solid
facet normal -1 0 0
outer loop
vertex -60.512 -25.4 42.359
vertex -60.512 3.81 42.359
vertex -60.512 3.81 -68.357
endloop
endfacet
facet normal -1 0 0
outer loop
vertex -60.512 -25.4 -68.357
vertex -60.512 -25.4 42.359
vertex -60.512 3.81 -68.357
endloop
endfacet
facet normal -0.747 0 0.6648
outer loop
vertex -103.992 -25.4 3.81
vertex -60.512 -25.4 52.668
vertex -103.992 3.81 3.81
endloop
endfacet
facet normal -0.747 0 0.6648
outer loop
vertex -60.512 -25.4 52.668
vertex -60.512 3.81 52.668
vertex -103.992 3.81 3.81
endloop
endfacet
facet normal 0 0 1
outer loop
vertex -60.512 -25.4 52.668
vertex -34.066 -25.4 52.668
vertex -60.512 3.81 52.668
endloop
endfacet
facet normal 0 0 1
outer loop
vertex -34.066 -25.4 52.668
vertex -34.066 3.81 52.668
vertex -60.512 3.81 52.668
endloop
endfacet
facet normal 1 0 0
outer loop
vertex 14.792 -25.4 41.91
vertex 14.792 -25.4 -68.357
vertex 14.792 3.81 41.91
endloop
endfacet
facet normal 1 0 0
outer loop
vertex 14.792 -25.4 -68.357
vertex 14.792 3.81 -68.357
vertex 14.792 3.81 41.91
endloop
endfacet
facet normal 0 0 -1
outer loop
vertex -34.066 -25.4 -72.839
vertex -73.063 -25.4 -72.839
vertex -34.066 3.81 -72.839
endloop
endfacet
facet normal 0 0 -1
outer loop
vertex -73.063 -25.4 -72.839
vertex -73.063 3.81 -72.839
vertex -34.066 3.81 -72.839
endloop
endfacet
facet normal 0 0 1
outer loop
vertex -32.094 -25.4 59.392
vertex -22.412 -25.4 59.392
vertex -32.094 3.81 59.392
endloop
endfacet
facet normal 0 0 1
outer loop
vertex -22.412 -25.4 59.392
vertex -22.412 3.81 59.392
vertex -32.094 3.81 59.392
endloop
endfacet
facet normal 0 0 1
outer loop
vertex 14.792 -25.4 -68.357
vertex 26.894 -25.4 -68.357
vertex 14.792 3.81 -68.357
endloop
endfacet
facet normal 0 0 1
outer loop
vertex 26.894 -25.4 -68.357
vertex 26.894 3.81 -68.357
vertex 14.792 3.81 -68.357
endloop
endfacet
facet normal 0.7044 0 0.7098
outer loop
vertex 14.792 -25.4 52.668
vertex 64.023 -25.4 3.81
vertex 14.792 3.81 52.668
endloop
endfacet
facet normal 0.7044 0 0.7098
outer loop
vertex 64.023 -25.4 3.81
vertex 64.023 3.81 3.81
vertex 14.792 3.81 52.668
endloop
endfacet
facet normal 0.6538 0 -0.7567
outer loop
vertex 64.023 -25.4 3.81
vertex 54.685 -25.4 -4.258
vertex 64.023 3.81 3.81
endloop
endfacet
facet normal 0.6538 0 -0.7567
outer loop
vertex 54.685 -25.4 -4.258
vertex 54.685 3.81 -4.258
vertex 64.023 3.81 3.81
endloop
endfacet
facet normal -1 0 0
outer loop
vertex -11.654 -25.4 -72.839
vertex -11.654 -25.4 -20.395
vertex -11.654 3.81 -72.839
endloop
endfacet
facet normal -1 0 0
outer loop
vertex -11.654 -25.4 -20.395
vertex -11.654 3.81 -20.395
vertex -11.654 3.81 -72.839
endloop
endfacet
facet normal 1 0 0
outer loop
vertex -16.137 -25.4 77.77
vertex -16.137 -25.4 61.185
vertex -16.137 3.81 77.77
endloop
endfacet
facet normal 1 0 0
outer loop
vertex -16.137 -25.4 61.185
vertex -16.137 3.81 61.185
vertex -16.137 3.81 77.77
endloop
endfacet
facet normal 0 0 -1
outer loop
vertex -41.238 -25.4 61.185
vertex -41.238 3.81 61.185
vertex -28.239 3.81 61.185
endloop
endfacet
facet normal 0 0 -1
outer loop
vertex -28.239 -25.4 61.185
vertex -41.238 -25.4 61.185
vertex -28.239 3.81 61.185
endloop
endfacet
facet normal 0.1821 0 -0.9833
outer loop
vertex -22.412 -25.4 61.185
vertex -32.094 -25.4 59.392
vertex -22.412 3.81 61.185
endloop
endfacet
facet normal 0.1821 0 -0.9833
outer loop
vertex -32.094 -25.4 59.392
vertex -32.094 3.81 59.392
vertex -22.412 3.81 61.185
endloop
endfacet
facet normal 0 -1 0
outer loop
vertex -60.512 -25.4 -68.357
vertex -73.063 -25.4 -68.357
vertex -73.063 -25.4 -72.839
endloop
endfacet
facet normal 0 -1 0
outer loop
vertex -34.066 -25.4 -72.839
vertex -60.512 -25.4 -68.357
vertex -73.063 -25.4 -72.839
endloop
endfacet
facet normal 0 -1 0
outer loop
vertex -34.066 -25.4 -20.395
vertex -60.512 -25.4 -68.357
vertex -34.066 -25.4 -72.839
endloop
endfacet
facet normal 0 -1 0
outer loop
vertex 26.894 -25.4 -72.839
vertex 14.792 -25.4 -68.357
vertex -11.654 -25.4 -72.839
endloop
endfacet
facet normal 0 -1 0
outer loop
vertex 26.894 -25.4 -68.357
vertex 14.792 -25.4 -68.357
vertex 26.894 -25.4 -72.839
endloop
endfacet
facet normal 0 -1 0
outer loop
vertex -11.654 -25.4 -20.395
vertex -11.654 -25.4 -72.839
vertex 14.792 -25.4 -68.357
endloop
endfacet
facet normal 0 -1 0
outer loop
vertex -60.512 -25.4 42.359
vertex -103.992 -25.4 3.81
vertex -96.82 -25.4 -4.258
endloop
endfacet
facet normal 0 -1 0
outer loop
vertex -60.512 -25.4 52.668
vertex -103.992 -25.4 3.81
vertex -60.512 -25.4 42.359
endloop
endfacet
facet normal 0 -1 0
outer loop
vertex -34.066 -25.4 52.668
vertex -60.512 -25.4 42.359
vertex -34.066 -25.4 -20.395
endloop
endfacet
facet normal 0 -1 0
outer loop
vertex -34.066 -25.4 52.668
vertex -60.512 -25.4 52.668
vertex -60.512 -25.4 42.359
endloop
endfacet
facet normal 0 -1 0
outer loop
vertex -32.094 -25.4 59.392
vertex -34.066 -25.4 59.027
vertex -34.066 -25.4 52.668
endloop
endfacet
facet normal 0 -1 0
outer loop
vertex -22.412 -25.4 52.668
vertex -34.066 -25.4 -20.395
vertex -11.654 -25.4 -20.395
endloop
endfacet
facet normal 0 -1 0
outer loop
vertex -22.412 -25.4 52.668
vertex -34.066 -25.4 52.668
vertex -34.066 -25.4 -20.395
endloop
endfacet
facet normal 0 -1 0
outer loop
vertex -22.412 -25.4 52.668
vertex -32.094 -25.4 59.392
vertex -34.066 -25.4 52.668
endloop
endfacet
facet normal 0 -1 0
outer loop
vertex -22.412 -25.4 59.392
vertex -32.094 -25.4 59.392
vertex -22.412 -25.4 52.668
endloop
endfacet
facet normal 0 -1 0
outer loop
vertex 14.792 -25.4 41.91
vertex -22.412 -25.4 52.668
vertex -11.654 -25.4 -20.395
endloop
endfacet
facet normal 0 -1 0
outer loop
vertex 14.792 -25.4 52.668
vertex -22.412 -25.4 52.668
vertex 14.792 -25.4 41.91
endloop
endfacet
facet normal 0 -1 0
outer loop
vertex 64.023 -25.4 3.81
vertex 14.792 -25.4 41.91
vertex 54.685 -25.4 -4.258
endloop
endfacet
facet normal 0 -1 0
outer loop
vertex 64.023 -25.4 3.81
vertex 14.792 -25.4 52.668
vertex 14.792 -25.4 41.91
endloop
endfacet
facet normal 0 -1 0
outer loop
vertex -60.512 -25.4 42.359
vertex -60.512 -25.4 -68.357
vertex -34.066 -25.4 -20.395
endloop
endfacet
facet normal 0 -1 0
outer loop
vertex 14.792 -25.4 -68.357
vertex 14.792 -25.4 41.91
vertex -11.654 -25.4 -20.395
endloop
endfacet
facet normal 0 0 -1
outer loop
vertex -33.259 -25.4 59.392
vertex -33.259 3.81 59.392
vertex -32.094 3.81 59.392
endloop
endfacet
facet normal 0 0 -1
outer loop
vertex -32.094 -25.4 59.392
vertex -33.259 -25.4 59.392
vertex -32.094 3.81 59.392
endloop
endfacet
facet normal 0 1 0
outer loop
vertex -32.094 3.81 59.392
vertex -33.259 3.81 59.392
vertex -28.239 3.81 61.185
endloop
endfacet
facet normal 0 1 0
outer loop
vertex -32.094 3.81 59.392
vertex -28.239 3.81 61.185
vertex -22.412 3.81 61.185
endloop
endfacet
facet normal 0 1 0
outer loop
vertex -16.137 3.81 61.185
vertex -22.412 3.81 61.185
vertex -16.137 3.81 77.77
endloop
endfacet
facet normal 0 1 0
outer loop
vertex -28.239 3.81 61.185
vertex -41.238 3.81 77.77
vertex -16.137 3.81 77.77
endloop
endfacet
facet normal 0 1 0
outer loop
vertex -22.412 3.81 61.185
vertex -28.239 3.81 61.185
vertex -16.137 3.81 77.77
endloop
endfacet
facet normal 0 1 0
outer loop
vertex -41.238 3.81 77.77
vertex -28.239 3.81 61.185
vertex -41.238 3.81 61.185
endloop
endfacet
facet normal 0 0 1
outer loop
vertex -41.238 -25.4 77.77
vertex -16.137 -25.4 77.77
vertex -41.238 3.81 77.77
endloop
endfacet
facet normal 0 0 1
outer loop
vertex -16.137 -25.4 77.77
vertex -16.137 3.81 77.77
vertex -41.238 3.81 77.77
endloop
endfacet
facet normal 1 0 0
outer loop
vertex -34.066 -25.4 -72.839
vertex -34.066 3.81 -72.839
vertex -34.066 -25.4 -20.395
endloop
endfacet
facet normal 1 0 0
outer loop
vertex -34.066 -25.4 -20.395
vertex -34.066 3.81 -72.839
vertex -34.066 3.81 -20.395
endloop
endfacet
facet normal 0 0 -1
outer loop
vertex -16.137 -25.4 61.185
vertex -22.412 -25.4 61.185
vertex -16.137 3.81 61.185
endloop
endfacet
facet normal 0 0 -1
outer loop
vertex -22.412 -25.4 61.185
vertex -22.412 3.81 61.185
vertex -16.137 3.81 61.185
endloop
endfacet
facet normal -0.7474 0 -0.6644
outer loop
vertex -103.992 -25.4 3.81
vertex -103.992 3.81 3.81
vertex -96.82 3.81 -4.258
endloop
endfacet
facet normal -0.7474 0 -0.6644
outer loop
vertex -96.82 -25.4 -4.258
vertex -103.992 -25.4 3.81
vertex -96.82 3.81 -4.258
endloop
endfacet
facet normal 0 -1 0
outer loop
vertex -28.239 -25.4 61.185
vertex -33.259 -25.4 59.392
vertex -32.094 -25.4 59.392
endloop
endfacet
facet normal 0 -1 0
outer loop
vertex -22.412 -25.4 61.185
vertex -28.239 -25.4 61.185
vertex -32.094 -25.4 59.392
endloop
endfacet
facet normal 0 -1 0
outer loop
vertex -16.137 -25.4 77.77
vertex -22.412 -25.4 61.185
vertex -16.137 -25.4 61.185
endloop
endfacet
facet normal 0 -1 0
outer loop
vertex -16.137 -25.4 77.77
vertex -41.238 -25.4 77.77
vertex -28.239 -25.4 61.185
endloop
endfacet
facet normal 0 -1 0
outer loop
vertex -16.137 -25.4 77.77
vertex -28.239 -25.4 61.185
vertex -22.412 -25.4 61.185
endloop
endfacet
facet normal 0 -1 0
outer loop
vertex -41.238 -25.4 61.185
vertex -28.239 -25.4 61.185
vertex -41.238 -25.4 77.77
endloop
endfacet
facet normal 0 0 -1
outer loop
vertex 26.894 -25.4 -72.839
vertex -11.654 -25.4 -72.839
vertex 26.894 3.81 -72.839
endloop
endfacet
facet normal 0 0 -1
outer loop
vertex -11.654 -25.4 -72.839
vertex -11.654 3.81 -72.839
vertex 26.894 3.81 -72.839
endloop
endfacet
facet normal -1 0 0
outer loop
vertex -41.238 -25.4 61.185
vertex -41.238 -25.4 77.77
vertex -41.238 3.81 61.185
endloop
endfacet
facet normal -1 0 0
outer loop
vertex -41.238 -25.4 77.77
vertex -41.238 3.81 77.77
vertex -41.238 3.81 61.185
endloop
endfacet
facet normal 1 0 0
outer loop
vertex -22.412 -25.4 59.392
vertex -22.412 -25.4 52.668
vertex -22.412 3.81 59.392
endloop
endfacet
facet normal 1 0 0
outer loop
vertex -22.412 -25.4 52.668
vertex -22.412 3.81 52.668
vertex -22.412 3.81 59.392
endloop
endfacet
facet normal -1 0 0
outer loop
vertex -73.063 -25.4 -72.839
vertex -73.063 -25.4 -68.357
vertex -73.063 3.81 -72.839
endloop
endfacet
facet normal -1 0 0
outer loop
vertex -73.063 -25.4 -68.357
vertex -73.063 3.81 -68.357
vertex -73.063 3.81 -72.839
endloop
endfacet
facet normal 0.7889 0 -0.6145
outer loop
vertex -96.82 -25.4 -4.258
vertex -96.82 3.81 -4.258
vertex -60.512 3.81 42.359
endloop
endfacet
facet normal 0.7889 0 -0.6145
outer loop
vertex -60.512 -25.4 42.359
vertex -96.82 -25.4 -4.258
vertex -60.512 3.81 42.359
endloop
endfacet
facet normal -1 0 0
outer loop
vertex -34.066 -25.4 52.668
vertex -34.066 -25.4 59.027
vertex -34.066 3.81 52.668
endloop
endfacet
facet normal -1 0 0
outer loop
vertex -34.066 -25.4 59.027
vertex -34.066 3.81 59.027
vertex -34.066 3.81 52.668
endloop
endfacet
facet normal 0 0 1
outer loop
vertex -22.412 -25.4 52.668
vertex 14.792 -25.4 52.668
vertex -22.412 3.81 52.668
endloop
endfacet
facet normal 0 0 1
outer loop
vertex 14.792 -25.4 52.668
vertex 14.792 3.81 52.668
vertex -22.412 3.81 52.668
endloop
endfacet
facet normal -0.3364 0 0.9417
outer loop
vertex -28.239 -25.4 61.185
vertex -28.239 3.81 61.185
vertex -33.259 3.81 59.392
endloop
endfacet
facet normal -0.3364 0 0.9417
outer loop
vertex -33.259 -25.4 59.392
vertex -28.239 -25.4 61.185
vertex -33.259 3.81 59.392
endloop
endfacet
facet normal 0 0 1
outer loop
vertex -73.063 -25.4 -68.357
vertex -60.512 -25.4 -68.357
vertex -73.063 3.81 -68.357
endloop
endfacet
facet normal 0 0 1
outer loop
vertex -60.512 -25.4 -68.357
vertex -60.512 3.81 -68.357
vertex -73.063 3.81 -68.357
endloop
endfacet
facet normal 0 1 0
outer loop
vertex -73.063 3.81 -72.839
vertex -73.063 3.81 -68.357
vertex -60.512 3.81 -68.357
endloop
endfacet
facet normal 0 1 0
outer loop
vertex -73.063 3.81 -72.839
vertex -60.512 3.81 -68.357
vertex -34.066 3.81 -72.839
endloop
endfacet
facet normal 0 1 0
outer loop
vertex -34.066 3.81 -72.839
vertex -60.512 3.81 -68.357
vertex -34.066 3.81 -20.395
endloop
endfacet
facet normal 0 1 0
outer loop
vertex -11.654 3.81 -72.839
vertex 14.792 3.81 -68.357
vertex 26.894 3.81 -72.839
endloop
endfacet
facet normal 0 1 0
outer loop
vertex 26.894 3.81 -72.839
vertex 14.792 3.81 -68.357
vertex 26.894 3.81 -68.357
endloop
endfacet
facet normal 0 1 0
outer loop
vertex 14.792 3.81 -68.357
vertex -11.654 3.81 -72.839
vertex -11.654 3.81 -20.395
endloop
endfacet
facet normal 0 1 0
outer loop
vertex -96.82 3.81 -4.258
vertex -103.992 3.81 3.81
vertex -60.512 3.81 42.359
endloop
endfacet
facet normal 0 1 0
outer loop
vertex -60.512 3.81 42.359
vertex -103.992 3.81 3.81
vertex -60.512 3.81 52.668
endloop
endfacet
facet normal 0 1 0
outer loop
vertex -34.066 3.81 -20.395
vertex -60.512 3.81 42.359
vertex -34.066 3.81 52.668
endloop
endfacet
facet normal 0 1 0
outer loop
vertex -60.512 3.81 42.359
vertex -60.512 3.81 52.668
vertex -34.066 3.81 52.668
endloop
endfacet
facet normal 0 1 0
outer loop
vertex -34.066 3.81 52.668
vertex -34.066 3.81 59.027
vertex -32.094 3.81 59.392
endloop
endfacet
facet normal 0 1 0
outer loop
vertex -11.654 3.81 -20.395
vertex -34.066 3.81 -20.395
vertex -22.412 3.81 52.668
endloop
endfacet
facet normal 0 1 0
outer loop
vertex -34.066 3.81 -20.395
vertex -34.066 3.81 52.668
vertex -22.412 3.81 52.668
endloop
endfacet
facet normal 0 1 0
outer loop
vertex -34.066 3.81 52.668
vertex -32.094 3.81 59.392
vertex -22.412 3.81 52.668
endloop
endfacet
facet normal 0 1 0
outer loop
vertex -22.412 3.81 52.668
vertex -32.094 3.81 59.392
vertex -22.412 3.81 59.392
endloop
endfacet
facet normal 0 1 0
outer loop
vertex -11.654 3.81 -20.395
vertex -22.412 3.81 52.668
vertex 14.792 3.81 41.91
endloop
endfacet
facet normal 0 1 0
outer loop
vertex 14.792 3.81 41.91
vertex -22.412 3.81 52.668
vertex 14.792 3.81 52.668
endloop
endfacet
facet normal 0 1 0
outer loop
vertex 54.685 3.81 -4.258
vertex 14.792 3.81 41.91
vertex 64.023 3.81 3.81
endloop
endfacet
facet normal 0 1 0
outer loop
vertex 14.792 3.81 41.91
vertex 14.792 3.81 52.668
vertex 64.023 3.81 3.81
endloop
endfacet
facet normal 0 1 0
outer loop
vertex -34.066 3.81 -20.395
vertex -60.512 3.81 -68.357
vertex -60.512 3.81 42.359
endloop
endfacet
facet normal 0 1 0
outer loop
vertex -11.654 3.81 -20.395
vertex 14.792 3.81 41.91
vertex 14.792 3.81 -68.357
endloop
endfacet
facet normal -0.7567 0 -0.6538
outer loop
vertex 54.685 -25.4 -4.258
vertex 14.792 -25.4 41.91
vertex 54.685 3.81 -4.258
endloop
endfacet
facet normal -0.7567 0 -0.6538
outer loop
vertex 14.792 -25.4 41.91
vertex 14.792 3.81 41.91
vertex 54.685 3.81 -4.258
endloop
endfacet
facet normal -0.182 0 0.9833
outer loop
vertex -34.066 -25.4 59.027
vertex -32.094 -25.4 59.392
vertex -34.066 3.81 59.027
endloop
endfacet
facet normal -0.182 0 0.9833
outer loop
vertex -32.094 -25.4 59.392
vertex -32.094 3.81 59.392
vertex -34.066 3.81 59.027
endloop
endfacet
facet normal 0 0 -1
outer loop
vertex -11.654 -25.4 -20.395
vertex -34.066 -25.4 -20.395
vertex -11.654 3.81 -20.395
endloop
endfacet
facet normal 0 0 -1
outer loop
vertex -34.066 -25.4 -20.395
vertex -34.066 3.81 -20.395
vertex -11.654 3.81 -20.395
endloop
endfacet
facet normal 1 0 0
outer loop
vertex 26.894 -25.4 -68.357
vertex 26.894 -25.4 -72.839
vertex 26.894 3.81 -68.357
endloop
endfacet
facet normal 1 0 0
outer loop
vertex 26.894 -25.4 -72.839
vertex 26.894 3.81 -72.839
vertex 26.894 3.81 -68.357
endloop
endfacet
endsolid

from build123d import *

# Parameters (mm, degrees)
F0_W     = 26.4462009072
F0_H     = 47.9617509991
F0_W_2   = 26.4461962506
F1_DEPTH = 3.81
F2_DEPTH = 25.4
F3_DEPTH = 25.4


with BuildPart() as f1:
    # F0 (on Front) → F1 (new body)
    with BuildSketch(Plane.XZ):
        Polygon((-60.5124868453, 42.3587411642), (-60.5124868453, -8.7406923994), (14.7919422016, -8.7406923994), (14.7919422016, 41.9104993343), (54.6853654087, -4.2582862079), (64.0228714011, 3.8100455422), (14.7919422016, 52.6682771742), (-5.8271270245, 52.6682771742), (-22.412031889, 52.6682771742), (-34.066285938, 52.6682771742), (-45.2723056078, 52.6682771742), (-60.5124868453, 52.6682771742), (-103.9918288589, 3.8100455422), (-96.8199819326, -4.2582862079), align=None)
        with Locations((-47.2893863916, -44.375824742)):
            Rectangle(F0_W, F0_H)
        with Locations((1.5688440762, -44.375824742)):
            Rectangle(F0_W_2, F0_H)
        Polygon((-60.5124868453, -8.7406923994), (-60.5124868453, -20.3949492425), (-34.066285938, -20.3949492425), (-11.6542540491, -20.3949492425), (14.7919422016, -20.3949492425), (14.7919422016, -8.7406923994), align=None)
        Polygon((14.7919422016, -68.3567002416), (-11.6542540491, -68.3567002416), (-11.6542540491, -72.8391036391), (6.7236125469, -72.8391036391), (26.8944427371, -72.8391036391), (26.8944427371, -68.3567002416), align=None)
        Polygon((-34.066285938, -68.3567002416), (-60.5124868453, -68.3567002416), (-73.0632245541, -68.3567002416), (-73.0632245541, -72.8391036391), (-52.8923943639, -72.8391036391), (-34.066285938, -72.8391036391), align=None)
        Polygon((-34.066285938, 59.0266520042), (-34.066285938, 52.6682771742), (-22.412031889, 52.6682771742), (-22.412031889, 59.3918859959), (-32.0940245688, 59.3918859959), align=None)
    extrude(amount=-F1_DEPTH)

    # F2 (add): a face of the model
    f2_faces = [f1.faces().sort_by_distance(p)[0] for p in [
        (-22.1011180392, 0, -1.8982815448),
    ]]


with BuildPart() as f1b:
    # F0 (on Front) → F1, piece 2 (new body)
    with BuildSketch(Plane.XZ):
        Polygon((-33.2594519109, 59.3918859959), (-32.0940245688, 59.3918859959), (-22.412031889, 61.1848495901), (-16.1366611719, 61.1848495901), (-16.1366611719, 77.7697563171), (-41.2381365895, 77.7697563171), (-41.2381365895, 61.1848495901), (-34.066285938, 61.1848495901), (-28.2391589135, 61.1848495901), align=None)
    extrude(amount=-F1_DEPTH)


with BuildPart() as f1_1:
    add(f1.part)

    add(f1b.part)  # F2 merges F1b
    extrude(f2_faces, amount=F2_DEPTH)

    # F3 (add): a face of the model
    f3_faces = [f1_1.faces().sort_by_distance(p)[0] for p in [
        (-28.6799367318, 0, 69.3439445937),
    ]]
    extrude(f3_faces, amount=F3_DEPTH)


solid = f1_1.part
